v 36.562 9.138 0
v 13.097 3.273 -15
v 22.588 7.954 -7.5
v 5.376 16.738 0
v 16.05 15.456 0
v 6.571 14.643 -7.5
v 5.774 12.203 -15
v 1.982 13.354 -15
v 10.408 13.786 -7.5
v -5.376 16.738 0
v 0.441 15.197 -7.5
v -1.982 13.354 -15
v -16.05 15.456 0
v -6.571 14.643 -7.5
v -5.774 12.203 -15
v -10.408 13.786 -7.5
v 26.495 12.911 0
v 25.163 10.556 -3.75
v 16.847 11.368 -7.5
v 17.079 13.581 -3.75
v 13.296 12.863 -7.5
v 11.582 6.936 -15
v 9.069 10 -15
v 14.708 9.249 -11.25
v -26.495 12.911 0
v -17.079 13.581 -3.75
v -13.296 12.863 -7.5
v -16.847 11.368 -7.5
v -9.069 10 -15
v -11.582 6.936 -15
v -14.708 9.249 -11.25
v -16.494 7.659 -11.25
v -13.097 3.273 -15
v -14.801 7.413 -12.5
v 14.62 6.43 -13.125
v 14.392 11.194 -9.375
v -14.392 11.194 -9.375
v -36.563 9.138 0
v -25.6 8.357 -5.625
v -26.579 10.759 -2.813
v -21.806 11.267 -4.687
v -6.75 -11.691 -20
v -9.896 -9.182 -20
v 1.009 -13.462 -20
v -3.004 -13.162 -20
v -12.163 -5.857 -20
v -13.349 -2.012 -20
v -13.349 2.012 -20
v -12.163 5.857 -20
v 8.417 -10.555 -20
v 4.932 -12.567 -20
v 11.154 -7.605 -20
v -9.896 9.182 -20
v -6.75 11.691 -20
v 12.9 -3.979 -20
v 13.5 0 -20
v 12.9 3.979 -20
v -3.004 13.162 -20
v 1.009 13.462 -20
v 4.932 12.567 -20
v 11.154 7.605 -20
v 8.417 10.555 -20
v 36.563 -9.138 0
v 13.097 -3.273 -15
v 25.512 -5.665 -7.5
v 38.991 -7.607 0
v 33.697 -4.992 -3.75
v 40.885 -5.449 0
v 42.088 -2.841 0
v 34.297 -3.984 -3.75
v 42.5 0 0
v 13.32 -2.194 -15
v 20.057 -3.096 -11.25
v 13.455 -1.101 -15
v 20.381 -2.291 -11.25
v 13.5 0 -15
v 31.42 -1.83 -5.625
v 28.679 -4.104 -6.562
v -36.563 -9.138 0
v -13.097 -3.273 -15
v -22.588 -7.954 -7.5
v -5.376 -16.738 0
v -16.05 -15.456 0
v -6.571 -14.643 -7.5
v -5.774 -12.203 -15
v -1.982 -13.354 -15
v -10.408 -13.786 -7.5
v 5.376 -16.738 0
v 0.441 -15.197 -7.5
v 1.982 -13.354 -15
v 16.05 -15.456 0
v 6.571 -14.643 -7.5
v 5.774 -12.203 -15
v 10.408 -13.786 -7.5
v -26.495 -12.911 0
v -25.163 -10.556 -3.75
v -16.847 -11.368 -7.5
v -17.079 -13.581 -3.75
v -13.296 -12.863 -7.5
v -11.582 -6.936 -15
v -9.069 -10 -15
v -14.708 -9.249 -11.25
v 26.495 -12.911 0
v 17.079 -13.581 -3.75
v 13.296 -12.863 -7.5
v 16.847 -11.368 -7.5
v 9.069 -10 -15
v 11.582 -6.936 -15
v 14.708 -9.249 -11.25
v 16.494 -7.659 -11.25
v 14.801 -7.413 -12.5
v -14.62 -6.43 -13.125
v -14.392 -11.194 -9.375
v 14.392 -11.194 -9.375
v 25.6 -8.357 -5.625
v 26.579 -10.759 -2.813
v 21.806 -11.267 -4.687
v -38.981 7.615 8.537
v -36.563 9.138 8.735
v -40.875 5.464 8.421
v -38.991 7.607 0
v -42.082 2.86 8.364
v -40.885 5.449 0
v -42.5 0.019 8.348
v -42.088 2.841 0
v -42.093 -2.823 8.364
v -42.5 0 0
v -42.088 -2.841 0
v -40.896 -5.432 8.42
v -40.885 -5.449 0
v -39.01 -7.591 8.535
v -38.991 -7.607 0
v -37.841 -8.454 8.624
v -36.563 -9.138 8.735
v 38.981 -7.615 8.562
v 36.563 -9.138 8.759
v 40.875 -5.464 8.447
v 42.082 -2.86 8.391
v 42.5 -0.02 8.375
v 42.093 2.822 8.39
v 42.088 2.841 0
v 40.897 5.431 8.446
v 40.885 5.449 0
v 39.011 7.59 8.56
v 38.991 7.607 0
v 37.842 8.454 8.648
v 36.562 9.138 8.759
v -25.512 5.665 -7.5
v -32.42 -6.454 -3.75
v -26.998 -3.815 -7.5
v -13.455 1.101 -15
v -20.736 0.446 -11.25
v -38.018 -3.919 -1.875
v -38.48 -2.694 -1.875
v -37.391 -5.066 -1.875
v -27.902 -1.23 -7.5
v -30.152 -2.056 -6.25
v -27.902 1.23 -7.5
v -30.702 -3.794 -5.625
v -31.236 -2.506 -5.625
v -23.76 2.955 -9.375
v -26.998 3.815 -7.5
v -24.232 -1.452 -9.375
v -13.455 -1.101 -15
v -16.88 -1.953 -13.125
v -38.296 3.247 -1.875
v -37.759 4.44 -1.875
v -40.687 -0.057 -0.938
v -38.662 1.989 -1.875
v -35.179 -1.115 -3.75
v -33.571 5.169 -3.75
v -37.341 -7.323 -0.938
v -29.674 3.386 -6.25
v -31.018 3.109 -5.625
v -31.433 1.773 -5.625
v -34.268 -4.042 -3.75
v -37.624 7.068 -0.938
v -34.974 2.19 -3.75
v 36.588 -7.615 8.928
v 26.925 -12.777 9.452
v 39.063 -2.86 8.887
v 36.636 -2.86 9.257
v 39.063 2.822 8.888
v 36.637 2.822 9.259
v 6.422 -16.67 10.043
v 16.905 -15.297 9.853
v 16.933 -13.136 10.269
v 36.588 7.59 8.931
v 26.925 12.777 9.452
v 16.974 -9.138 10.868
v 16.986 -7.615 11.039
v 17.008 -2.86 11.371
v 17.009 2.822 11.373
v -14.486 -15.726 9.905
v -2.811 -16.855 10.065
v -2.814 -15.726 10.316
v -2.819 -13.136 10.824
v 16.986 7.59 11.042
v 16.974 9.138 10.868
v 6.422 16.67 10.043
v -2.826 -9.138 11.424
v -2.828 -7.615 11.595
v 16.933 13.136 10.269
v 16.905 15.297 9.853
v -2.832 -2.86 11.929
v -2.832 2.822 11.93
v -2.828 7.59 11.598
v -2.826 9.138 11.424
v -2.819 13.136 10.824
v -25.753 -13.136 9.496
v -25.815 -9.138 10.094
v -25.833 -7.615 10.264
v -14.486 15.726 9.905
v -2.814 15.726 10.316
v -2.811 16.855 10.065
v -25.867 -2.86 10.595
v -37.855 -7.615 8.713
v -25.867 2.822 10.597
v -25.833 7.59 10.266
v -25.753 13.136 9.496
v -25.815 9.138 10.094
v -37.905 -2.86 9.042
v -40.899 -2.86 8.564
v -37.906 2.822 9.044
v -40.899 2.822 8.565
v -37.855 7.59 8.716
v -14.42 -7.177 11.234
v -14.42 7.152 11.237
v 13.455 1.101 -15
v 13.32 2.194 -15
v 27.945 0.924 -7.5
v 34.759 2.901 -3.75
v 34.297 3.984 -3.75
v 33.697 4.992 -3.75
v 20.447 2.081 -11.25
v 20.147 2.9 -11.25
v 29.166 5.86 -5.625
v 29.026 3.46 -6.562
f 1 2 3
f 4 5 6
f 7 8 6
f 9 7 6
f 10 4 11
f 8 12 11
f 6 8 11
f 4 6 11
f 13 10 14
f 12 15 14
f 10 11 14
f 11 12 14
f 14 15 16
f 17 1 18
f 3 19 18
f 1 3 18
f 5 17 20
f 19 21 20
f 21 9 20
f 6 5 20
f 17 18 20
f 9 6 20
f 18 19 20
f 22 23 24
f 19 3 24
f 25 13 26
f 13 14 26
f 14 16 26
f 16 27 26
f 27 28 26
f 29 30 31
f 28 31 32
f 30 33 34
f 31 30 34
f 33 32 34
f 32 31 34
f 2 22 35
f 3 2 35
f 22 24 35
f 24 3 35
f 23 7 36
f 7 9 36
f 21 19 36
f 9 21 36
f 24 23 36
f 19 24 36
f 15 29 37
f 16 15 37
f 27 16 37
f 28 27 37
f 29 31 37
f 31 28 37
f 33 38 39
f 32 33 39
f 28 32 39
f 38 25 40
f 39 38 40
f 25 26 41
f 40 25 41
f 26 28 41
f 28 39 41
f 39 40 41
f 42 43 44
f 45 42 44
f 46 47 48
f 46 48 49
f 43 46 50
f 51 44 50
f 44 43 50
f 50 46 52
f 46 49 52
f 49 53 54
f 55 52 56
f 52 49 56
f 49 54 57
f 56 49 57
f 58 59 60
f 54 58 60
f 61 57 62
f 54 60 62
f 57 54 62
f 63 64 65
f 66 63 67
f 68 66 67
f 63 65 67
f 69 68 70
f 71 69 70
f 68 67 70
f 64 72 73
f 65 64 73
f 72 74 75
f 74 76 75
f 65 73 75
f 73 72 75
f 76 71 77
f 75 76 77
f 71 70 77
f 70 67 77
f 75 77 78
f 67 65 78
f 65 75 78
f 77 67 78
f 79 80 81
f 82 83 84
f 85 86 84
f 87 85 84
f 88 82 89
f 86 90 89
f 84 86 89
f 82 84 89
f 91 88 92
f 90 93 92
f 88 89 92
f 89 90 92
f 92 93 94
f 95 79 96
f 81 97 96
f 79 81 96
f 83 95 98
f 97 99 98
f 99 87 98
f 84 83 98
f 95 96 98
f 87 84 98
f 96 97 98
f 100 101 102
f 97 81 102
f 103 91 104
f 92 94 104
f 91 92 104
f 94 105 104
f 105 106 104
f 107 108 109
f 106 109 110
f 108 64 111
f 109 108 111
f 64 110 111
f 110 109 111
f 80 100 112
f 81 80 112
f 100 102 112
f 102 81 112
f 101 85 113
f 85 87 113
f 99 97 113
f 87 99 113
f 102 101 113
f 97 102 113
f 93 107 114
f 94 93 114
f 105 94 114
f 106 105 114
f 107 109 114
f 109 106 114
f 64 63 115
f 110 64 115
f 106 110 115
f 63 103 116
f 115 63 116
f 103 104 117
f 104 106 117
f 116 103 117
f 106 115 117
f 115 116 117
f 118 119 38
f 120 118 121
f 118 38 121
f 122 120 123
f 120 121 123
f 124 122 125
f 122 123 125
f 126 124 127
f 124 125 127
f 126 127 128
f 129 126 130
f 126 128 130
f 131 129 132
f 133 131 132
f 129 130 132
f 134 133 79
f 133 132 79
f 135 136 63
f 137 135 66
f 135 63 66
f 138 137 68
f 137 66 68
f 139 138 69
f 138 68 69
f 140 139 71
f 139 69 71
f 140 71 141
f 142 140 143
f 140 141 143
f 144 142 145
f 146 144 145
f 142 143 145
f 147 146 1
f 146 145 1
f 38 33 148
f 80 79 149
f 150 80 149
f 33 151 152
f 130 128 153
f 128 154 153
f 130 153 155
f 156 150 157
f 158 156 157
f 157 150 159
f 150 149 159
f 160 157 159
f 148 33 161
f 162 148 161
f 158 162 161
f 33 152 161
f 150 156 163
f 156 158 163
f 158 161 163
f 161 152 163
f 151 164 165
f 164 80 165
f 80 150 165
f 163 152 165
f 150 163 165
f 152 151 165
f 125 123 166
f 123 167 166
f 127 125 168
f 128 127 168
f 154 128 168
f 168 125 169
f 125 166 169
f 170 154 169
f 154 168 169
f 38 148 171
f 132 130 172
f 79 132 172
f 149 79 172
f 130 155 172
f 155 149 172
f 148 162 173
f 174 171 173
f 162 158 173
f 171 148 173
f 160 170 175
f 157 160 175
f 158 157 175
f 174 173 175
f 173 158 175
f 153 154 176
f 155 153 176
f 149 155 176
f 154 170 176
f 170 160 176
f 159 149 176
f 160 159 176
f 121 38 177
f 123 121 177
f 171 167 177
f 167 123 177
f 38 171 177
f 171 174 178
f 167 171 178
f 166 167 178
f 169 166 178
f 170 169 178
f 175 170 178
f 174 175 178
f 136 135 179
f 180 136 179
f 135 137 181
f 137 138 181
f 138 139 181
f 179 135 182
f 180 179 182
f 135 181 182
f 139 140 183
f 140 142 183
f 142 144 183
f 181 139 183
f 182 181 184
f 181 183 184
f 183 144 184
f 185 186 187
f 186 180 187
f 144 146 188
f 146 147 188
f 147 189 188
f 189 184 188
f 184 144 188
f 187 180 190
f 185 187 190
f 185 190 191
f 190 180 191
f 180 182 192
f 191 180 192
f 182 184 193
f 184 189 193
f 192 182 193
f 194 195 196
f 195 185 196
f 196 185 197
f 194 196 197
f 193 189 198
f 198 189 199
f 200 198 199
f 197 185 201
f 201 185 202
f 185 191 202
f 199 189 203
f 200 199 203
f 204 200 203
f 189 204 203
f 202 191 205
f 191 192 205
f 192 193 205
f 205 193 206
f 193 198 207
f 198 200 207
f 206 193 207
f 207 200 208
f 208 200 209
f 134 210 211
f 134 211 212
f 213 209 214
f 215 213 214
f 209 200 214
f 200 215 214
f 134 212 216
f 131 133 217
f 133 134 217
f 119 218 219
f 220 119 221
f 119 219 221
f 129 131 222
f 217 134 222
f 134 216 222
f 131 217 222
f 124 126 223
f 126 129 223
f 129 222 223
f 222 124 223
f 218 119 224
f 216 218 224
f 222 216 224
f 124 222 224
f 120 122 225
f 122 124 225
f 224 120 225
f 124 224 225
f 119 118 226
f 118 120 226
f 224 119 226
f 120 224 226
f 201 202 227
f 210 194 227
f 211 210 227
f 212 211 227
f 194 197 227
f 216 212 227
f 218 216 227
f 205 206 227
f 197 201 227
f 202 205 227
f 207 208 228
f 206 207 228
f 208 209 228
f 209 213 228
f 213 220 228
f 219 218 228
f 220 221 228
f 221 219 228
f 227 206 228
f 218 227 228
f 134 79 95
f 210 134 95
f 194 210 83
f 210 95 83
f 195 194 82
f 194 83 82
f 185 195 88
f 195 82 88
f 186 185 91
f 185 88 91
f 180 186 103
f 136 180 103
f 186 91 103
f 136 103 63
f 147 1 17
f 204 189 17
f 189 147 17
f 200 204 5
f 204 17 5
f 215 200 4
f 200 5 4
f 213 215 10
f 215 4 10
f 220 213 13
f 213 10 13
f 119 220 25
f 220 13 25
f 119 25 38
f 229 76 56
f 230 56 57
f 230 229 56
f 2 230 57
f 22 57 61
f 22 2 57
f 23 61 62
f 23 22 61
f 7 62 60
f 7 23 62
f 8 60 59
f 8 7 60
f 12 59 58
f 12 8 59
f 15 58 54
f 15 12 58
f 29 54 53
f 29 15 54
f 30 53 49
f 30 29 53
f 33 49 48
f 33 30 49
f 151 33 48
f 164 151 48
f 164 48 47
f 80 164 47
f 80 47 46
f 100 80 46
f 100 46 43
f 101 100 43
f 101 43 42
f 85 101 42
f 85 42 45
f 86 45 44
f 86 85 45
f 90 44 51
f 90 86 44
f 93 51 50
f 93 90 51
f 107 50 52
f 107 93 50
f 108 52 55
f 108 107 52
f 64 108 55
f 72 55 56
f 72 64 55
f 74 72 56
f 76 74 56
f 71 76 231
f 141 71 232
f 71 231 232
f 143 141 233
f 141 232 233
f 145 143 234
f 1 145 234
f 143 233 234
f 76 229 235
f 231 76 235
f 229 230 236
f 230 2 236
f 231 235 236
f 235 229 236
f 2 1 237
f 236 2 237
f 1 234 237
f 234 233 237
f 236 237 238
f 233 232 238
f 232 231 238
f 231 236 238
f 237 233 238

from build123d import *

# Parameters (mm, degrees)
SKETCH001_R  = 13.5
PAD_DEPTH    = 12
PAD001_DEPTH = 5


with BuildPart() as part:
    # Sketch → AdditiveLoft section 0
    with BuildSketch(Plane.XY):
        with BuildLine():
            ThreePointArc((-36.562505, 9.137617), (-42.5, 6e-06), (-36.562516, -9.137612))
            ThreePointArc((-36.562516, -9.137612), (-9e-06, -16.899042), (36.5625, -9.13762))
            ThreePointArc((36.5625, -9.13762), (42.5, 0), (36.5625, 9.13762))
            ThreePointArc((36.5625, 9.13762), (-3e-06, 16.899042), (-36.562505, 9.137617))
        make_face()
    # Sketch001 → AdditiveLoft section 1
    with BuildSketch(Plane.XY.offset(-15)):
        Circle(SKETCH001_R)
    loft()

    # Sketch → Pad (new body)
    with BuildSketch(Plane.XY):
        with BuildLine():
            ThreePointArc((-36.562505, 9.137617), (-42.5, 6e-06), (-36.562516, -9.137612))
            ThreePointArc((-36.562516, -9.137612), (-9e-06, -16.899042), (36.5625, -9.13762))
            ThreePointArc((36.5625, -9.13762), (42.5, 0), (36.5625, 9.13762))
            ThreePointArc((36.5625, 9.13762), (-3e-06, 16.899042), (-36.562505, 9.137617))
        make_face()
    extrude(amount=PAD_DEPTH)

    # Sketch001 → Pad001 (join)
    with BuildSketch(Plane.XY.offset(-15)):
        Circle(SKETCH001_R)
    extrude(amount=-PAD001_DEPTH)

    # SubtractivePipe: sweep along a path in Sketch002
    with BuildLine(Plane.XZ) as subtractivepipe_path:
        ThreePointArc((54.893133, 5.916665), (0.078349, 12), (-54.736434, 5.916665))
    # Sketch003 → SubtractivePipe (sweep, cut)
    with BuildSketch(Plane.YZ):
        with BuildLine():
            ThreePointArc((33.346504, 4.178945), (1.160914, 11.991015), (-31.251067, 5.178962))
            Line((-31.251067, 5.178962), (-31.251067, 34.885342))
            Line((-31.251067, 34.885342), (33.346504, 34.885342))
            Line((33.346504, 34.885342), (33.346504, 4.178945))
        make_face()
    sweep(path=subtractivepipe_path.line, mode=Mode.SUBTRACT)


solid = part.part
